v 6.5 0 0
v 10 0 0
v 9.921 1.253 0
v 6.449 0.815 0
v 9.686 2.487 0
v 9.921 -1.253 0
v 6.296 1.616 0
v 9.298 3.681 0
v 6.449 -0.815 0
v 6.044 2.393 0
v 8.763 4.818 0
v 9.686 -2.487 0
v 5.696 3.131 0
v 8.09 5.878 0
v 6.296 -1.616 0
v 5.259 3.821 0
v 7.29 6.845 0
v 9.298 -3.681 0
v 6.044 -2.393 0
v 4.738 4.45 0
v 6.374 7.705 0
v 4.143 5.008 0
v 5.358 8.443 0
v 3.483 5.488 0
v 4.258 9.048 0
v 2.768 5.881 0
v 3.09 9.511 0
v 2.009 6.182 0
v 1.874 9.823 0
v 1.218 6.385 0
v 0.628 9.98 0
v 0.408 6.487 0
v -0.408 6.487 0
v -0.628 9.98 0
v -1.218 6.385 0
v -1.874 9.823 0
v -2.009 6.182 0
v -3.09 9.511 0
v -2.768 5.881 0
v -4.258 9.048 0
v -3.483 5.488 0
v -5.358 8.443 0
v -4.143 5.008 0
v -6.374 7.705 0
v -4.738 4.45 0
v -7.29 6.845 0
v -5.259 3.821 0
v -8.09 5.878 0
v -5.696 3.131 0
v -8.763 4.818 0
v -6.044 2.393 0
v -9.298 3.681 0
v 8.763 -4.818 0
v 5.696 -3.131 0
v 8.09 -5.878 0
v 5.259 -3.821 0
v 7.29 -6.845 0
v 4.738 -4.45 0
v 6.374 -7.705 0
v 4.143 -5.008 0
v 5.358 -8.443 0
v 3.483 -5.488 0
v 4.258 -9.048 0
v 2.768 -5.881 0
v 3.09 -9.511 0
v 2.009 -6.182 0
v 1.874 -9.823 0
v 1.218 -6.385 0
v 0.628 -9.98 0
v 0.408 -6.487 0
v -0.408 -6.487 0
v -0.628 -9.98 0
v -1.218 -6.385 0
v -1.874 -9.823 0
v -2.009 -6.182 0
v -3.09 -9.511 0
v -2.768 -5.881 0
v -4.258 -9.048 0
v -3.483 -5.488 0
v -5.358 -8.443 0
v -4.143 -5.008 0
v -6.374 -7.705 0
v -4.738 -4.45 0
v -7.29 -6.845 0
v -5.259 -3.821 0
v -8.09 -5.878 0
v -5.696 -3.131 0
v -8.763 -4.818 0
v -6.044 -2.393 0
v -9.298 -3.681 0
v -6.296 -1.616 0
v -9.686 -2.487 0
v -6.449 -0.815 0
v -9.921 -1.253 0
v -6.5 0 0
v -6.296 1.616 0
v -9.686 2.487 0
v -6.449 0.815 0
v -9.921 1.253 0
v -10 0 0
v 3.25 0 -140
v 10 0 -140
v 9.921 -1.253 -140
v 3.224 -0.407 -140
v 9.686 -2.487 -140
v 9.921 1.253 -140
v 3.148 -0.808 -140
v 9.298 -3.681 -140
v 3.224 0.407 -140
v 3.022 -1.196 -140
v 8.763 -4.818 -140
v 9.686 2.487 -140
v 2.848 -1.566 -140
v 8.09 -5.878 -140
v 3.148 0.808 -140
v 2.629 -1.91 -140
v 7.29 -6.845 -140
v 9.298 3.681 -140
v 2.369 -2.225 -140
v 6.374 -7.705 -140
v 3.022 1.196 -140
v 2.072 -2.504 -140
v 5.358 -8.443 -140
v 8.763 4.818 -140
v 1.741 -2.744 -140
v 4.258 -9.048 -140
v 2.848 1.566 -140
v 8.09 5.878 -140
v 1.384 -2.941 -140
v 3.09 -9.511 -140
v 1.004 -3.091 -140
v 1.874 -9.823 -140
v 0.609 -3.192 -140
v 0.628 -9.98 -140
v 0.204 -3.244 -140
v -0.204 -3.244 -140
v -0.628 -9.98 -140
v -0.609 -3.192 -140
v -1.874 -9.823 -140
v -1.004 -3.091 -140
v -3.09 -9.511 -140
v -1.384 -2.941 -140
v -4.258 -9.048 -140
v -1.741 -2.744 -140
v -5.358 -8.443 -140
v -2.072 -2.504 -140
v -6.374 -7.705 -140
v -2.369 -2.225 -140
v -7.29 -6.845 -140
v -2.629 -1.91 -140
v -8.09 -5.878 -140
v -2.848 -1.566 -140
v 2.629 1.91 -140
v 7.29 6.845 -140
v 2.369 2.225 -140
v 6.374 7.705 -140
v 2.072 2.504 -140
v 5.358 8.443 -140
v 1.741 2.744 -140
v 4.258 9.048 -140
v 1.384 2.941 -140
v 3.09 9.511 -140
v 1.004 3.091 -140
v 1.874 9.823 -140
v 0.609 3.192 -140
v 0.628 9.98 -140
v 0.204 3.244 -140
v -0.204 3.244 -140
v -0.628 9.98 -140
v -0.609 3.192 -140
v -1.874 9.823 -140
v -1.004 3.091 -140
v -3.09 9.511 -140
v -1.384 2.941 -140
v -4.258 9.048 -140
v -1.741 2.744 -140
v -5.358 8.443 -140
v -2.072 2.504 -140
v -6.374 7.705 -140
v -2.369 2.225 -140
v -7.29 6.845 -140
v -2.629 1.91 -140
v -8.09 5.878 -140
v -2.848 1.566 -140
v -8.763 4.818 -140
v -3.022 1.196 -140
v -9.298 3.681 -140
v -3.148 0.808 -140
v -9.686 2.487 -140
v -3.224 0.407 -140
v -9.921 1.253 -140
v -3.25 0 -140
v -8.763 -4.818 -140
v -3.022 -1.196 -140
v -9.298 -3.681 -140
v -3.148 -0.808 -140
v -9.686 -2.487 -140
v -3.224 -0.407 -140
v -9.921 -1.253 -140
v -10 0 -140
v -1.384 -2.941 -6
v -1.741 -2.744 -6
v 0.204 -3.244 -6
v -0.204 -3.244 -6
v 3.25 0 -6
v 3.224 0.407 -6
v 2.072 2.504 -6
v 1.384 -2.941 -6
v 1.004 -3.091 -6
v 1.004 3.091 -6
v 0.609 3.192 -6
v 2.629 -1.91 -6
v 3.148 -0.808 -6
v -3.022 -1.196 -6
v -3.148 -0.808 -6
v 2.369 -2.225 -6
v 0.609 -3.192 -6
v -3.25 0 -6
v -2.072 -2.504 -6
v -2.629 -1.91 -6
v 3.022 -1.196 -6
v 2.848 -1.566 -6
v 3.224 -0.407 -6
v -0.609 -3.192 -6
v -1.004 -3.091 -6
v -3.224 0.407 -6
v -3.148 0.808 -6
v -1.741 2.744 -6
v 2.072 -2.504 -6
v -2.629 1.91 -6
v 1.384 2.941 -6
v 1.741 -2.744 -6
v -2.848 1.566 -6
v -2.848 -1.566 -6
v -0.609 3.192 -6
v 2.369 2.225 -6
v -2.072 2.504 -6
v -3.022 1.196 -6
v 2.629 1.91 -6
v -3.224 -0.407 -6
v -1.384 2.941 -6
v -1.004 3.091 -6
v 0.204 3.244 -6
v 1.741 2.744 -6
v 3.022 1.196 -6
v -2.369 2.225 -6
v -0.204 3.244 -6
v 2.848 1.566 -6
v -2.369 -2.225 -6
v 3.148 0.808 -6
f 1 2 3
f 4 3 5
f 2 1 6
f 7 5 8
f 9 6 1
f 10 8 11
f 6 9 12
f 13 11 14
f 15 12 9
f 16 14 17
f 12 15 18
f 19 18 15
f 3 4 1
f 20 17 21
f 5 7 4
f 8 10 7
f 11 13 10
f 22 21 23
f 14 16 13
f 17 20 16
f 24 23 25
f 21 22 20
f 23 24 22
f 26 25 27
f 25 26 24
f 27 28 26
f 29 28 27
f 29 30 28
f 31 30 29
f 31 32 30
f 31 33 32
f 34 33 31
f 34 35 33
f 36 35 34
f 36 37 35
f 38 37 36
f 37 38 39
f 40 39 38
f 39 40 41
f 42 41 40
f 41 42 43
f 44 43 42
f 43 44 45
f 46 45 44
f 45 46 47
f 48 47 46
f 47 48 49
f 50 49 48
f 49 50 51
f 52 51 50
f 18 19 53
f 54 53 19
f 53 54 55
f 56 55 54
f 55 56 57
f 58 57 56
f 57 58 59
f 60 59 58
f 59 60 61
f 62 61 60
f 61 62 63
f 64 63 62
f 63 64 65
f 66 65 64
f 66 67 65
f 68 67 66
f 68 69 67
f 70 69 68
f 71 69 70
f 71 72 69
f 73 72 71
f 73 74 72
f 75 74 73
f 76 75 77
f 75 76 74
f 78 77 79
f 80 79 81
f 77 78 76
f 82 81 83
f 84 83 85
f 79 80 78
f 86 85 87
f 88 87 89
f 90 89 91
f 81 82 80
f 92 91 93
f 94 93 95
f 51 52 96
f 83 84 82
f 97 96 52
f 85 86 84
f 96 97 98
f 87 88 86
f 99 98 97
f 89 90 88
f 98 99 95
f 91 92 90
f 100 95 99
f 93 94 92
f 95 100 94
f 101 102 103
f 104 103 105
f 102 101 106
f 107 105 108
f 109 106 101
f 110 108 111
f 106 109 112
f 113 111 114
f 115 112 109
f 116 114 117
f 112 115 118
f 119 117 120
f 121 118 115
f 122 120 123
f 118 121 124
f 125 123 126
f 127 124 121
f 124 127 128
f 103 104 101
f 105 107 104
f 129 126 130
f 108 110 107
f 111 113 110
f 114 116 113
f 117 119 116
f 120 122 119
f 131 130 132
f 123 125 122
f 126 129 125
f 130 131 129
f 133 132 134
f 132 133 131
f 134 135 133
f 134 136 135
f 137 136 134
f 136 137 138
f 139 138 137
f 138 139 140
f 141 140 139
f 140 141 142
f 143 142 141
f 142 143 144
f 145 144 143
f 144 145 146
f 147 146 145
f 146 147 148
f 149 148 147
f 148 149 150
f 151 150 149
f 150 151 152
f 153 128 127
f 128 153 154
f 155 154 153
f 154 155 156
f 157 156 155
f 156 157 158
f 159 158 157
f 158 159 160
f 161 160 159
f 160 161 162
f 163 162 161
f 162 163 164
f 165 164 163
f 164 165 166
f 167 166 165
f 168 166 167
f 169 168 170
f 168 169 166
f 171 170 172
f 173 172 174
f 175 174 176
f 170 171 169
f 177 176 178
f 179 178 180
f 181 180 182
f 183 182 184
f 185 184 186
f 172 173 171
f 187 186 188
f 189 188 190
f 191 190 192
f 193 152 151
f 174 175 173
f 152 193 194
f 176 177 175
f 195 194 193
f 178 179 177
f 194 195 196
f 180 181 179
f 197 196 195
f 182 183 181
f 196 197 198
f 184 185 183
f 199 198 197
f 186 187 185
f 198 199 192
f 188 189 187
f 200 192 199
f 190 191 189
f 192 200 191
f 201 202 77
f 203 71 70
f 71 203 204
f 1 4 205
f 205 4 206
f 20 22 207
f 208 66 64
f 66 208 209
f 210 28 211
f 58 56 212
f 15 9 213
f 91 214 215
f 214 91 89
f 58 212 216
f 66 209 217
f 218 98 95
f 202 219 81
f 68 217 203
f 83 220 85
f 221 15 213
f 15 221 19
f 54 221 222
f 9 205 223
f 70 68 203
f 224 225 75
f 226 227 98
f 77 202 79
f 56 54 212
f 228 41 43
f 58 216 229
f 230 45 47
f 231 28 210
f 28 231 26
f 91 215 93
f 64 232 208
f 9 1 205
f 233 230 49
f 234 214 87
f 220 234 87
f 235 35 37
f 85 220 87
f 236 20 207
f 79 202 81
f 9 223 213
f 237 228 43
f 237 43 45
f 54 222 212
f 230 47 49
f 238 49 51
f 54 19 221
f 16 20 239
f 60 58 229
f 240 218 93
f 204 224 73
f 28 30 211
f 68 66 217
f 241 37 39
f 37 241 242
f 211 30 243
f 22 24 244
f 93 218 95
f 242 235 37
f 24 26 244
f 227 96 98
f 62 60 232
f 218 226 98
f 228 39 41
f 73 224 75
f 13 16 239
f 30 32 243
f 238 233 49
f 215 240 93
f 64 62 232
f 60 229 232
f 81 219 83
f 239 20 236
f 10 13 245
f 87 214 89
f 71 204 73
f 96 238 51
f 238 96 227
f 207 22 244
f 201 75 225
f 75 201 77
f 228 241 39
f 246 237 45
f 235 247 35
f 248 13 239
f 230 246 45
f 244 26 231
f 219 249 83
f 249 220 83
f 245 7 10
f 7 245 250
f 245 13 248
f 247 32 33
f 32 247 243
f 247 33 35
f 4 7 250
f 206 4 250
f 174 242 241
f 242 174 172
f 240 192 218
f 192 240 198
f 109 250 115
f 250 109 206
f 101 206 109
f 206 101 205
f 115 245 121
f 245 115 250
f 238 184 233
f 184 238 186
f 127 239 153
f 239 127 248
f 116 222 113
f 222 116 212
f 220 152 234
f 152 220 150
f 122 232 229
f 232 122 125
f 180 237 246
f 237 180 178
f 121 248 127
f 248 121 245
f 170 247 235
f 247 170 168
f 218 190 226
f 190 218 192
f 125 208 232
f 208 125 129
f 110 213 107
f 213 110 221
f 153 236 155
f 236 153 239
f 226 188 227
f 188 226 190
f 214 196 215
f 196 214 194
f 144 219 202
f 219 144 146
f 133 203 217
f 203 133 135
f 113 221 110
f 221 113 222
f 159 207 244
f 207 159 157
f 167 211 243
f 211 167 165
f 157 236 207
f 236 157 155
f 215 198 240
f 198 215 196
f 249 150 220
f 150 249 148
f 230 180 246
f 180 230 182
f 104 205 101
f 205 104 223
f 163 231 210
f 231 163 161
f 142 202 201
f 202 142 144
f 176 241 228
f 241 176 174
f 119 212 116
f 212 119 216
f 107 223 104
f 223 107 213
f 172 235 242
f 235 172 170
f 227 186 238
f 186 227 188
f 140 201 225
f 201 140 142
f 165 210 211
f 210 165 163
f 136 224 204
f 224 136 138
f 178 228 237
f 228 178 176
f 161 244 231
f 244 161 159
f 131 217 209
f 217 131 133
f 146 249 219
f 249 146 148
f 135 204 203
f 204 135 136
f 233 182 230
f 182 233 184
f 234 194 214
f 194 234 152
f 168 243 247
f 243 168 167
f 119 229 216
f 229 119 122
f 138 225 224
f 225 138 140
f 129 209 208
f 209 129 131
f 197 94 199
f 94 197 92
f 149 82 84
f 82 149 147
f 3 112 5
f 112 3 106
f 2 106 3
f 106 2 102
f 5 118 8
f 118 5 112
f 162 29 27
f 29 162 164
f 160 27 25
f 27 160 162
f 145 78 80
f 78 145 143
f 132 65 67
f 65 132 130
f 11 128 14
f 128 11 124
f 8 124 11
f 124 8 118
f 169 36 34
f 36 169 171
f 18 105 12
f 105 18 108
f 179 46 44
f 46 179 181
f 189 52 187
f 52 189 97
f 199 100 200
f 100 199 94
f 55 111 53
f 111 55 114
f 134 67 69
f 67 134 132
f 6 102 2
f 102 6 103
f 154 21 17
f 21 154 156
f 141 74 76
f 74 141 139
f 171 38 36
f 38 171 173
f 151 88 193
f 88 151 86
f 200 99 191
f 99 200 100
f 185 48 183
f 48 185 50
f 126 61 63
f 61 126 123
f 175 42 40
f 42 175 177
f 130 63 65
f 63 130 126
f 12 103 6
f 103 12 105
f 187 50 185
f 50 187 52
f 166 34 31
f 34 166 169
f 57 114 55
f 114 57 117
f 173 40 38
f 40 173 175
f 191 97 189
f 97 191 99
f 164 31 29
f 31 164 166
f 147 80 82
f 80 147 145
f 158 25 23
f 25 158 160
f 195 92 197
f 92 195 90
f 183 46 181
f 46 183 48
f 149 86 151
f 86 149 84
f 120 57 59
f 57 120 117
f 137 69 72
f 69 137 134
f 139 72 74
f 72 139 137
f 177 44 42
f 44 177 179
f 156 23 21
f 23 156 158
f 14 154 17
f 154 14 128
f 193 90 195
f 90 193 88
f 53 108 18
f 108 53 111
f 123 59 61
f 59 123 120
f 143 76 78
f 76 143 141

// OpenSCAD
$fn = 50;


difference() {
	union() {
		translate(v = [0, 0, -140.0000000000]) {
			cylinder(h = 140, r = 10.0000000000);
		}
	}
	union() {
		translate(v = [0, 0, 0]) {
			rotate(a = [0, 0, 0]) {
				difference() {
					union() {
						#translate(v = [0, 0, -140.0000000000]) {
							cylinder(h = 140, r = 2.2500000000);
						}
						#translate(v = [0, 0, -6]) {
							cylinder(h = 6, r = 10.0000000000, r1 = 3.2500000000, r2 = 6.5000000000);
						}
						#translate(v = [0, 0, -140.0000000000]) {
							cylinder(h = 140, r = 3.2500000000);
						}
						#translate(v = [0, 0, -140.0000000000]) {
							cylinder(h = 140, r = 2.2500000000);
						}
					}
					union();
				}
			}
		}
	}
}
